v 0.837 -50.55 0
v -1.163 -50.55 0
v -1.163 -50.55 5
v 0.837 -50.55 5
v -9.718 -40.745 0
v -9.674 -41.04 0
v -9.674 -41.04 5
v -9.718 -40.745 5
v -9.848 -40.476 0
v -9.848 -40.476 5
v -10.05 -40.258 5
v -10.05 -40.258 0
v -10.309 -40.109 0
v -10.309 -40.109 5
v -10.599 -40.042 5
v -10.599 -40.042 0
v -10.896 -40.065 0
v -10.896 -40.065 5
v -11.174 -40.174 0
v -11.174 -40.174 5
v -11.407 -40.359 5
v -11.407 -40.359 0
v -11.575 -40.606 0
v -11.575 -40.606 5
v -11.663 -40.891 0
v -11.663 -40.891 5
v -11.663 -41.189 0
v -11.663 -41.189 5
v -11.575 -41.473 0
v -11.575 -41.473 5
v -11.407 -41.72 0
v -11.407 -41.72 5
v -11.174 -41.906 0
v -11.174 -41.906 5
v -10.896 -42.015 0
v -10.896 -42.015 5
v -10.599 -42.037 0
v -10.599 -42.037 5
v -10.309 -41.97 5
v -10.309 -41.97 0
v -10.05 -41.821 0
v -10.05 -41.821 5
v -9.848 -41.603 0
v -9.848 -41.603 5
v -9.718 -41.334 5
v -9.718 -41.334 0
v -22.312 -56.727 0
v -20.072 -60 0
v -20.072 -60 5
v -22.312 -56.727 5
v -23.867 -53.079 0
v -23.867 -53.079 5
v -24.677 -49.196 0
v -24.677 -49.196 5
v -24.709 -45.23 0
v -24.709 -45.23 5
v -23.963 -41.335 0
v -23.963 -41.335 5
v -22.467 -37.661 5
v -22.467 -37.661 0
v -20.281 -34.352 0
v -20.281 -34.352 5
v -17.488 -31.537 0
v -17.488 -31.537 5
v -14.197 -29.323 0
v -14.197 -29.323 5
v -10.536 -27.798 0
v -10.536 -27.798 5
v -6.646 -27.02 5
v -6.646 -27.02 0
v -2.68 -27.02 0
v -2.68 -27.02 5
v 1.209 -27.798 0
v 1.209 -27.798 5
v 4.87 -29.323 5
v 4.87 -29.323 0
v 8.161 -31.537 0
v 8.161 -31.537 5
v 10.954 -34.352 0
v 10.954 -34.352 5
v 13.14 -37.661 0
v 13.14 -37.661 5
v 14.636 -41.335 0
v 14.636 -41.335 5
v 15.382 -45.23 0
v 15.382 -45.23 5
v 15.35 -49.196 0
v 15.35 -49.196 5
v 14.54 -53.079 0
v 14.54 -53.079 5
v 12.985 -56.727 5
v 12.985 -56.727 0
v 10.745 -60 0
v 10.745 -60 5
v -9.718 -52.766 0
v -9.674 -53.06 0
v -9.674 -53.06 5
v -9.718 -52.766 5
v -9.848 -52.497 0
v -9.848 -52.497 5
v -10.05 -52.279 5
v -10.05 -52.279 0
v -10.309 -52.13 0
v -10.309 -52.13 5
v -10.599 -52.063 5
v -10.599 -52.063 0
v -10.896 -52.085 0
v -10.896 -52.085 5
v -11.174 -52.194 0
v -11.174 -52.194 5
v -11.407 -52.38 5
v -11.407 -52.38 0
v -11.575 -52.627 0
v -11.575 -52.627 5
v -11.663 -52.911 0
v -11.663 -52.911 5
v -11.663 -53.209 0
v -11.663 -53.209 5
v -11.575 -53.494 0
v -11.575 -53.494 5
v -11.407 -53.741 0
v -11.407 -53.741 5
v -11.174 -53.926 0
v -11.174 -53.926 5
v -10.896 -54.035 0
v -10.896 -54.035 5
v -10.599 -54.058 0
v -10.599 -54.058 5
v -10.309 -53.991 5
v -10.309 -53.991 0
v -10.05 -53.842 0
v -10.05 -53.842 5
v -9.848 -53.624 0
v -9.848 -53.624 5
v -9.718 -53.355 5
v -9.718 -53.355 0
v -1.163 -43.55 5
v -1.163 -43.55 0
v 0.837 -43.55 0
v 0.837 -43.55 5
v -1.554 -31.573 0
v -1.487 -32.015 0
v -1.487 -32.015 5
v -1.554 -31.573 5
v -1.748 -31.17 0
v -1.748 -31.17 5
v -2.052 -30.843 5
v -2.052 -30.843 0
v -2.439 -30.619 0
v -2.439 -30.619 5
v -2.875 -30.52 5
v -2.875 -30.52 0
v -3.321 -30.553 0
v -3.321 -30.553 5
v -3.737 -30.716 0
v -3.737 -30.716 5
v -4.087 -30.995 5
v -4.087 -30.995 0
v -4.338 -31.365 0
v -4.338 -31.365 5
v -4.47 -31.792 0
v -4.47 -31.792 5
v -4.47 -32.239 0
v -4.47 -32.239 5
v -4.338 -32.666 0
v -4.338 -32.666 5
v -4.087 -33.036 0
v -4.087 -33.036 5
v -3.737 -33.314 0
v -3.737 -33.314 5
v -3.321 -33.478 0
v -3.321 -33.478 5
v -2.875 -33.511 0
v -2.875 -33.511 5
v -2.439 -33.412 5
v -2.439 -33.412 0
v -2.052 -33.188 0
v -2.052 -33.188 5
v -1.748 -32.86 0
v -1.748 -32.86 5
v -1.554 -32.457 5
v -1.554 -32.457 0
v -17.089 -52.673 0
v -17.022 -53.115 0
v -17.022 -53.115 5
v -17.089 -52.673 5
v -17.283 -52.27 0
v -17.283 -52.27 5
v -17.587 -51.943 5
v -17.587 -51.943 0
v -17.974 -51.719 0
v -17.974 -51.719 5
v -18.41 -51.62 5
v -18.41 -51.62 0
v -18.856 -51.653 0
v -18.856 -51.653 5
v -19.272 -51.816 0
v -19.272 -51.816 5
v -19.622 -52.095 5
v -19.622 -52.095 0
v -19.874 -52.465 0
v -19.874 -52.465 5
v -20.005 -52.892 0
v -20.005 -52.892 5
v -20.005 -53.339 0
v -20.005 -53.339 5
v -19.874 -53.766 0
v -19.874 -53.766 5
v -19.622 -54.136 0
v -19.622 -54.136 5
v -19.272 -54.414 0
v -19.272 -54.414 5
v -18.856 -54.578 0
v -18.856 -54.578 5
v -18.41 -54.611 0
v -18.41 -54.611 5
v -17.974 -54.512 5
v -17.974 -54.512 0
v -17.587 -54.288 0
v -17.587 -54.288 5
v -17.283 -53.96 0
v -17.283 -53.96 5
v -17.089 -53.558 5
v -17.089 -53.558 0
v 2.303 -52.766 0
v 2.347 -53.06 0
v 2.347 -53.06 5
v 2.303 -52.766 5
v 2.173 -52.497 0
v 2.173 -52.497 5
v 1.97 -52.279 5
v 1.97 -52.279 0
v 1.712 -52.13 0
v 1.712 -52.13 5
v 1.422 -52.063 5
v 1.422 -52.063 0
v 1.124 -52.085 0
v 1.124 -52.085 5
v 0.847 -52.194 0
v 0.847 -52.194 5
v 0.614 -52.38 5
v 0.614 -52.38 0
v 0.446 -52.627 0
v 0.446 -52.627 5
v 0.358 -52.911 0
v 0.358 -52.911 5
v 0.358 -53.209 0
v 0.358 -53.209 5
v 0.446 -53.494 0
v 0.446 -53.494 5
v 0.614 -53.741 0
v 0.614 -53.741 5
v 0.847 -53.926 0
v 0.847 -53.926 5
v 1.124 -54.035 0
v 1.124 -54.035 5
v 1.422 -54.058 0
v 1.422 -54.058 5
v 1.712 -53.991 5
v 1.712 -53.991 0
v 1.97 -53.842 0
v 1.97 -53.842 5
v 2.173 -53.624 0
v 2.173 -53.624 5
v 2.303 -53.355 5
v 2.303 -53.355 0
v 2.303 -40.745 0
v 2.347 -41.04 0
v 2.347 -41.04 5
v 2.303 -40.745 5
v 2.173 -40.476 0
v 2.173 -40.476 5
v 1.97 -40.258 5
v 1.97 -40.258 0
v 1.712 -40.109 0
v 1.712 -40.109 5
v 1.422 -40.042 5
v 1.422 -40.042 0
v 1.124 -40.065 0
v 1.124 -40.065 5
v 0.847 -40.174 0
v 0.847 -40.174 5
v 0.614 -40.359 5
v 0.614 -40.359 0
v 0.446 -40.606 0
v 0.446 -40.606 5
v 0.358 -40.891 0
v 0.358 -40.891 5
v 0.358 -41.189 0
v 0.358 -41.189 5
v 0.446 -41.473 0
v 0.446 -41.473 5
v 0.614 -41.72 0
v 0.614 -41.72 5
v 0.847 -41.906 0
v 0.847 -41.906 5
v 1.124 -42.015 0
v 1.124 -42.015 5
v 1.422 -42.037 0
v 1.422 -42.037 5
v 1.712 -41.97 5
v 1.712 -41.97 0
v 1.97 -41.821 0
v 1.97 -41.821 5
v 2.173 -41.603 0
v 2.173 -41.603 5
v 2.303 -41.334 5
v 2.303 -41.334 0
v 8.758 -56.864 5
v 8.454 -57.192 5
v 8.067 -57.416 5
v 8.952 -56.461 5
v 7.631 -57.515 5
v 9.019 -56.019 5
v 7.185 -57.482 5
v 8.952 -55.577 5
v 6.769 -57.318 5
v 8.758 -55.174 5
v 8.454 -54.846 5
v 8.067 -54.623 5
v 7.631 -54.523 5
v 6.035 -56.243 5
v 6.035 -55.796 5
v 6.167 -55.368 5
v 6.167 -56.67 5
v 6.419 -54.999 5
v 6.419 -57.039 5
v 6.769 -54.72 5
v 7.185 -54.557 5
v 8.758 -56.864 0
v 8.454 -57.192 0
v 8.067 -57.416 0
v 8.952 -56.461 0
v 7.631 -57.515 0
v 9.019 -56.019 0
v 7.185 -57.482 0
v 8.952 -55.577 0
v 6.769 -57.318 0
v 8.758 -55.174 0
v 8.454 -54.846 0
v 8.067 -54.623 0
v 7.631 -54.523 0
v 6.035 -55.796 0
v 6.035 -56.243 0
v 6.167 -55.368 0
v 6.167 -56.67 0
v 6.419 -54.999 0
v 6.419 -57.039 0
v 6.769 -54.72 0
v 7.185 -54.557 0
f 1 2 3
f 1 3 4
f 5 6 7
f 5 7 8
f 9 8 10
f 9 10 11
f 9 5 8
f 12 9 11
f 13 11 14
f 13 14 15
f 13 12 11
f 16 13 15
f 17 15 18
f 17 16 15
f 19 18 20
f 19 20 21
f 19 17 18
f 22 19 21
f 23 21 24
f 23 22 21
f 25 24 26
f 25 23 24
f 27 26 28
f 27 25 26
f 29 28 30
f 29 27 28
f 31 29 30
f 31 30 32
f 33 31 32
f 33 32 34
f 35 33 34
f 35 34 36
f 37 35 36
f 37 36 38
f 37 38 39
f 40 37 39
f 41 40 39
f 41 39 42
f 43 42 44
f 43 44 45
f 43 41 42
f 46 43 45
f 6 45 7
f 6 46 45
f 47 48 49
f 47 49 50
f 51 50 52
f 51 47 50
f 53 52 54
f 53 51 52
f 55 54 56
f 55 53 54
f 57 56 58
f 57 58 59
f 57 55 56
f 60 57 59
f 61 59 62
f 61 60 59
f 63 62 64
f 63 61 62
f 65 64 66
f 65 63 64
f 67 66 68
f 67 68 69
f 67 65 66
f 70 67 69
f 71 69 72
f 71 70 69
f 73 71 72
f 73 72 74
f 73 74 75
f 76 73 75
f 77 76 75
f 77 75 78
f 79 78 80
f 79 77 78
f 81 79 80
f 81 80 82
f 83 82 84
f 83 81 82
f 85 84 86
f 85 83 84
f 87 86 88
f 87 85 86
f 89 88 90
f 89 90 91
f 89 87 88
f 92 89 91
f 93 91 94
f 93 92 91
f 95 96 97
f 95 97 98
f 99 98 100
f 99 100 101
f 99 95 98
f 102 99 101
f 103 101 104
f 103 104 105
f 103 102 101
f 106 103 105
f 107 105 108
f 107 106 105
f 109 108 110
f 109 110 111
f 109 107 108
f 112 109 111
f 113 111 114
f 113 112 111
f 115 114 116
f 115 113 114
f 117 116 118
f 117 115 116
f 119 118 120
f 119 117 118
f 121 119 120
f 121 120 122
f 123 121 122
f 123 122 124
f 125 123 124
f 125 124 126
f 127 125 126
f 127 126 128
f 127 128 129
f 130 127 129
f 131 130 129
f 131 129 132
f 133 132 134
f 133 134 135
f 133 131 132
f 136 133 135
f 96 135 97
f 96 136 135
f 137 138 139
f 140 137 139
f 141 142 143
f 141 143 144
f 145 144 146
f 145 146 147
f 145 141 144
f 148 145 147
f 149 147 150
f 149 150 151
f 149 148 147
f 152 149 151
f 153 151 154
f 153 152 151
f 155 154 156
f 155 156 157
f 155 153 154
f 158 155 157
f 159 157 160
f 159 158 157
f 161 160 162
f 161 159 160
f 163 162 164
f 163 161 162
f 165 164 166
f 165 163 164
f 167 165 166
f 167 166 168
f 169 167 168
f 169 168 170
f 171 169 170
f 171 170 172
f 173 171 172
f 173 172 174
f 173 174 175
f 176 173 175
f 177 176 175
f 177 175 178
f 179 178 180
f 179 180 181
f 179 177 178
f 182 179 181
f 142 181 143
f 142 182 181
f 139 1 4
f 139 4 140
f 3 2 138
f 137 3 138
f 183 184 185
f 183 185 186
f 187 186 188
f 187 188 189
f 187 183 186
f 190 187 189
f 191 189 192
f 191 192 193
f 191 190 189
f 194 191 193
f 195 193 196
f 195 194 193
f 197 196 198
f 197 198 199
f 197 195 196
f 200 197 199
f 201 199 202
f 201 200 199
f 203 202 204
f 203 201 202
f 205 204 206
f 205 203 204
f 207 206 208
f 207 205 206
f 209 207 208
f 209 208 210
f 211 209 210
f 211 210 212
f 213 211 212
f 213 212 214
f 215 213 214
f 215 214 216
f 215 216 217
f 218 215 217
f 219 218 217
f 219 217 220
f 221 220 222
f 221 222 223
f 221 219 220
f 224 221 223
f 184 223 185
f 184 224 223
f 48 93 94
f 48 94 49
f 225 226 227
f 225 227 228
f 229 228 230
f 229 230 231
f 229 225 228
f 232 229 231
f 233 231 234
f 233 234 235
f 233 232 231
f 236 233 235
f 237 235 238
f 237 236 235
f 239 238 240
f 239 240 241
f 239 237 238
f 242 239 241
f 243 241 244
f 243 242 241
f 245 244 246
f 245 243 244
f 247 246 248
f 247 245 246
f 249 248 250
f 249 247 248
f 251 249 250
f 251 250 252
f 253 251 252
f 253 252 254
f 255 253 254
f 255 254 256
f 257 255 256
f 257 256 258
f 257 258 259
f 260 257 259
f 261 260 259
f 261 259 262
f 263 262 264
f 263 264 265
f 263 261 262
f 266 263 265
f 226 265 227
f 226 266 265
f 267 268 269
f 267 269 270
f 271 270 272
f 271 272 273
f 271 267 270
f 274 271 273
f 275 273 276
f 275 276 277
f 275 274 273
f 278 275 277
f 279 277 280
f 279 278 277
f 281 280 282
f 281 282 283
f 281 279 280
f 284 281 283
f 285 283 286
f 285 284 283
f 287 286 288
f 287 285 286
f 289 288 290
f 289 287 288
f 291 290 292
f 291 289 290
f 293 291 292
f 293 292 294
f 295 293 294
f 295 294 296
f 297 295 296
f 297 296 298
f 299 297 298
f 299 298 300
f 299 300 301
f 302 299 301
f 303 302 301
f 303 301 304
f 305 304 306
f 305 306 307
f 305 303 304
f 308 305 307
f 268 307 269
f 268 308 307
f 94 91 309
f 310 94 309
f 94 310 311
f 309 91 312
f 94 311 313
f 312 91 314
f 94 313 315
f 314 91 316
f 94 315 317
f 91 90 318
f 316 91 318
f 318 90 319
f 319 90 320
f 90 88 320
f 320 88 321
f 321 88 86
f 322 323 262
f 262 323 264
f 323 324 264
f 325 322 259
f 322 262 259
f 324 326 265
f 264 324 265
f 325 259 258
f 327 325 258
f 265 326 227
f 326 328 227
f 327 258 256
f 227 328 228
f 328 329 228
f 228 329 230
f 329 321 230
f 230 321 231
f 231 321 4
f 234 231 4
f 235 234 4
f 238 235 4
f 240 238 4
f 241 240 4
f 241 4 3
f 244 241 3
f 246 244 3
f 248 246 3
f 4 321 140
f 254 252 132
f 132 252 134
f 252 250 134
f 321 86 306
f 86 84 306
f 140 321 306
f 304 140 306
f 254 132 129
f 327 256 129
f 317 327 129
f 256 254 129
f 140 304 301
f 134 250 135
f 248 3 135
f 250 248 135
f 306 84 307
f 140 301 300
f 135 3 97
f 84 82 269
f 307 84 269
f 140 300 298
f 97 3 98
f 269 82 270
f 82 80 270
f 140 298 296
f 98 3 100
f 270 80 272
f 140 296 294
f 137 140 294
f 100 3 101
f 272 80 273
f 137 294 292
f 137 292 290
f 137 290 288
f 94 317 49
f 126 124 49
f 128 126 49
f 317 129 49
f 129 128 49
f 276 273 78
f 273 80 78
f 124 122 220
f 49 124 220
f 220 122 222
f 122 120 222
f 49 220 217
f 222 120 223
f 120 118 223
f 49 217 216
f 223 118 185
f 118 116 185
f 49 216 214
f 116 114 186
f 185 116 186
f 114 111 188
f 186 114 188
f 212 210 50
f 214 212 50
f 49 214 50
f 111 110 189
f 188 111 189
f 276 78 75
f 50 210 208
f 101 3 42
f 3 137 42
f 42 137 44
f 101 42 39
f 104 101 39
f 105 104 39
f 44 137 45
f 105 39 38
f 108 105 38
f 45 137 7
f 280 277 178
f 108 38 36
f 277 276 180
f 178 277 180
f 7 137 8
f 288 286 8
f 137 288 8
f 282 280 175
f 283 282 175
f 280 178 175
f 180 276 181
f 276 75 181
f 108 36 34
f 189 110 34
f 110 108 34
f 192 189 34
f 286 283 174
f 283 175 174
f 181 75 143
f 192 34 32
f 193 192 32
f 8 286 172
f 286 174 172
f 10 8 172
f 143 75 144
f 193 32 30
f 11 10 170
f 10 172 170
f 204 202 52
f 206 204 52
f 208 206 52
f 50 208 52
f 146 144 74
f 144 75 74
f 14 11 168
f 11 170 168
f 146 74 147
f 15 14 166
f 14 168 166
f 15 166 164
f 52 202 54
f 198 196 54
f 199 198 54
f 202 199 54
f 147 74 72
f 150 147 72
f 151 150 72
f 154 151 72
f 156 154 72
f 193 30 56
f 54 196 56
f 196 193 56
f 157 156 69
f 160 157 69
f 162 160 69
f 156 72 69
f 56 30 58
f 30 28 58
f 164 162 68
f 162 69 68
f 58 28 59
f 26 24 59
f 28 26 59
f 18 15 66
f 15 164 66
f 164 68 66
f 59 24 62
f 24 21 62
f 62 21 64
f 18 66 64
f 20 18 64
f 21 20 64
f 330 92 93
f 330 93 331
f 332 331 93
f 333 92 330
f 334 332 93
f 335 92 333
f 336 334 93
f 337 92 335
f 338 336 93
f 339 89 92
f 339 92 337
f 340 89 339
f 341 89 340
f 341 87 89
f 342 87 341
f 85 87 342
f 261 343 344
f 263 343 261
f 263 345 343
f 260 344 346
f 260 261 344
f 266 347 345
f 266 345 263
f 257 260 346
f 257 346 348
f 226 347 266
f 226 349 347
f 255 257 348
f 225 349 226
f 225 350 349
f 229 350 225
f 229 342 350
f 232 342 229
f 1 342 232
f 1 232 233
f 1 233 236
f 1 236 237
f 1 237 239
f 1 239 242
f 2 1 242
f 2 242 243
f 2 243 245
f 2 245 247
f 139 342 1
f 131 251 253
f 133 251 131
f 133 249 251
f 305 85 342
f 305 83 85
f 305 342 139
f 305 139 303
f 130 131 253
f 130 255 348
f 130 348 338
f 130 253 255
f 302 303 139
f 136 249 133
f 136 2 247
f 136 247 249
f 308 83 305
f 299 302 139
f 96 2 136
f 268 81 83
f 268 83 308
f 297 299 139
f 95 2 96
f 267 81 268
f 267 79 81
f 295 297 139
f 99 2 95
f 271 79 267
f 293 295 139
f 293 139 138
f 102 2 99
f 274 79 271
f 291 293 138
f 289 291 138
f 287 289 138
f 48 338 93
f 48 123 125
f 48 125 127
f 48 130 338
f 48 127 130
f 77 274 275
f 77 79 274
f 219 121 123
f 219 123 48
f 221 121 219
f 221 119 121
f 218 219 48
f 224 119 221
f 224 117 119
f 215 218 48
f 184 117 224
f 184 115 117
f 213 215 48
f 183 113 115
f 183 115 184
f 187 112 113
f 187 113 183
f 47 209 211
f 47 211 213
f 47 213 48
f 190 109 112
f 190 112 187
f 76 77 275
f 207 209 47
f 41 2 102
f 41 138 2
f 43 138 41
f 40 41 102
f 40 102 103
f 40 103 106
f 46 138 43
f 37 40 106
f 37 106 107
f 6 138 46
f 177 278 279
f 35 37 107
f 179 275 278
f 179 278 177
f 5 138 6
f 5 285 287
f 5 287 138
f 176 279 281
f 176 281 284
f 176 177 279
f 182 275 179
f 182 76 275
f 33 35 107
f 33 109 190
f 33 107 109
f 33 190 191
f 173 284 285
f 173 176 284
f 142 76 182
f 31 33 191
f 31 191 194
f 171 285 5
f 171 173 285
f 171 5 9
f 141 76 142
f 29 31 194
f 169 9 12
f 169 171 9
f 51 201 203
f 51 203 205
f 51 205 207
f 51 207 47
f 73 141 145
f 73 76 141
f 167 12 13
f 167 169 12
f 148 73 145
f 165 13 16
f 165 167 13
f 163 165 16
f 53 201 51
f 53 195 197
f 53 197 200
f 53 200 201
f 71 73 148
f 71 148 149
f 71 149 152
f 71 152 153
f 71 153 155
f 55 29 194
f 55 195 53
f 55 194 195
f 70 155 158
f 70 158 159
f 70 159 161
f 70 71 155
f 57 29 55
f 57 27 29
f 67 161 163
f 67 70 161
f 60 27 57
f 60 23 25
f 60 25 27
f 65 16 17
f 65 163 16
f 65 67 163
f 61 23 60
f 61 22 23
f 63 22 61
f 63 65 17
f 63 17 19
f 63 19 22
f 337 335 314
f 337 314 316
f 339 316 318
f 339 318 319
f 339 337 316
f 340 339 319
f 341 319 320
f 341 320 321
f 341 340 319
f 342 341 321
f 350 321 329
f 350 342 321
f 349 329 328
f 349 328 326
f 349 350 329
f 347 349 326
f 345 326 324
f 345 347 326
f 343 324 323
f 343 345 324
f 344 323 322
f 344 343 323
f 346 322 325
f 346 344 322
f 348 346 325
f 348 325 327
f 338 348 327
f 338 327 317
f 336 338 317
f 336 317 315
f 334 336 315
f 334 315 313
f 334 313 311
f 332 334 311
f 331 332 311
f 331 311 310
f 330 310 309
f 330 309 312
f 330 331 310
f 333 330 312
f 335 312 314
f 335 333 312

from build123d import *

# Parameters (mm, degrees)
SKETCH1_R           = 1.5
SKETCH1_R_2         = 1
SKETCH1_W           = 2
SKETCH1_H           = 7
BOSS_EXTRUDE1_DEPTH = 5


with BuildPart() as part:
    # Sketch1 → Boss-Extrude1 (new body)
    with BuildSketch(Plane.XY):
        with BuildLine():
            Line((10.74521866, -60), (-20.072092256, -60))
            ThreePointArc((-20.072092256, -60), (-4.663436798, -26.922179377), (10.74521866, -60))
        make_face()
        with Locations((7.518690065, -56.019210774)):
            Circle(SKETCH1_R, mode=Mode.SUBTRACT)
        with Locations((-18.522064611, -53.115425948)):
            Circle(SKETCH1_R, mode=Mode.SUBTRACT)
        with Locations((-2.986935847, -32.015363278)):
            Circle(SKETCH1_R, mode=Mode.SUBTRACT)
        with Locations((1.346970842, -41.03959236)):
            Circle(SKETCH1_R_2, mode=Mode.SUBTRACT)
        with Locations((1.346970842, -53.06040764)):
            Circle(SKETCH1_R_2, mode=Mode.SUBTRACT)
        with Locations((-10.673844438, -53.06040764)):
            Circle(SKETCH1_R_2, mode=Mode.SUBTRACT)
        with Locations((-10.673844438, -41.03959236)):
            Circle(SKETCH1_R_2, mode=Mode.SUBTRACT)
        with Locations((-0.163436798, -47.05)):
            Rectangle(SKETCH1_W, SKETCH1_H, mode=Mode.SUBTRACT)
    extrude(amount=BOSS_EXTRUDE1_DEPTH)


solid = part.part
